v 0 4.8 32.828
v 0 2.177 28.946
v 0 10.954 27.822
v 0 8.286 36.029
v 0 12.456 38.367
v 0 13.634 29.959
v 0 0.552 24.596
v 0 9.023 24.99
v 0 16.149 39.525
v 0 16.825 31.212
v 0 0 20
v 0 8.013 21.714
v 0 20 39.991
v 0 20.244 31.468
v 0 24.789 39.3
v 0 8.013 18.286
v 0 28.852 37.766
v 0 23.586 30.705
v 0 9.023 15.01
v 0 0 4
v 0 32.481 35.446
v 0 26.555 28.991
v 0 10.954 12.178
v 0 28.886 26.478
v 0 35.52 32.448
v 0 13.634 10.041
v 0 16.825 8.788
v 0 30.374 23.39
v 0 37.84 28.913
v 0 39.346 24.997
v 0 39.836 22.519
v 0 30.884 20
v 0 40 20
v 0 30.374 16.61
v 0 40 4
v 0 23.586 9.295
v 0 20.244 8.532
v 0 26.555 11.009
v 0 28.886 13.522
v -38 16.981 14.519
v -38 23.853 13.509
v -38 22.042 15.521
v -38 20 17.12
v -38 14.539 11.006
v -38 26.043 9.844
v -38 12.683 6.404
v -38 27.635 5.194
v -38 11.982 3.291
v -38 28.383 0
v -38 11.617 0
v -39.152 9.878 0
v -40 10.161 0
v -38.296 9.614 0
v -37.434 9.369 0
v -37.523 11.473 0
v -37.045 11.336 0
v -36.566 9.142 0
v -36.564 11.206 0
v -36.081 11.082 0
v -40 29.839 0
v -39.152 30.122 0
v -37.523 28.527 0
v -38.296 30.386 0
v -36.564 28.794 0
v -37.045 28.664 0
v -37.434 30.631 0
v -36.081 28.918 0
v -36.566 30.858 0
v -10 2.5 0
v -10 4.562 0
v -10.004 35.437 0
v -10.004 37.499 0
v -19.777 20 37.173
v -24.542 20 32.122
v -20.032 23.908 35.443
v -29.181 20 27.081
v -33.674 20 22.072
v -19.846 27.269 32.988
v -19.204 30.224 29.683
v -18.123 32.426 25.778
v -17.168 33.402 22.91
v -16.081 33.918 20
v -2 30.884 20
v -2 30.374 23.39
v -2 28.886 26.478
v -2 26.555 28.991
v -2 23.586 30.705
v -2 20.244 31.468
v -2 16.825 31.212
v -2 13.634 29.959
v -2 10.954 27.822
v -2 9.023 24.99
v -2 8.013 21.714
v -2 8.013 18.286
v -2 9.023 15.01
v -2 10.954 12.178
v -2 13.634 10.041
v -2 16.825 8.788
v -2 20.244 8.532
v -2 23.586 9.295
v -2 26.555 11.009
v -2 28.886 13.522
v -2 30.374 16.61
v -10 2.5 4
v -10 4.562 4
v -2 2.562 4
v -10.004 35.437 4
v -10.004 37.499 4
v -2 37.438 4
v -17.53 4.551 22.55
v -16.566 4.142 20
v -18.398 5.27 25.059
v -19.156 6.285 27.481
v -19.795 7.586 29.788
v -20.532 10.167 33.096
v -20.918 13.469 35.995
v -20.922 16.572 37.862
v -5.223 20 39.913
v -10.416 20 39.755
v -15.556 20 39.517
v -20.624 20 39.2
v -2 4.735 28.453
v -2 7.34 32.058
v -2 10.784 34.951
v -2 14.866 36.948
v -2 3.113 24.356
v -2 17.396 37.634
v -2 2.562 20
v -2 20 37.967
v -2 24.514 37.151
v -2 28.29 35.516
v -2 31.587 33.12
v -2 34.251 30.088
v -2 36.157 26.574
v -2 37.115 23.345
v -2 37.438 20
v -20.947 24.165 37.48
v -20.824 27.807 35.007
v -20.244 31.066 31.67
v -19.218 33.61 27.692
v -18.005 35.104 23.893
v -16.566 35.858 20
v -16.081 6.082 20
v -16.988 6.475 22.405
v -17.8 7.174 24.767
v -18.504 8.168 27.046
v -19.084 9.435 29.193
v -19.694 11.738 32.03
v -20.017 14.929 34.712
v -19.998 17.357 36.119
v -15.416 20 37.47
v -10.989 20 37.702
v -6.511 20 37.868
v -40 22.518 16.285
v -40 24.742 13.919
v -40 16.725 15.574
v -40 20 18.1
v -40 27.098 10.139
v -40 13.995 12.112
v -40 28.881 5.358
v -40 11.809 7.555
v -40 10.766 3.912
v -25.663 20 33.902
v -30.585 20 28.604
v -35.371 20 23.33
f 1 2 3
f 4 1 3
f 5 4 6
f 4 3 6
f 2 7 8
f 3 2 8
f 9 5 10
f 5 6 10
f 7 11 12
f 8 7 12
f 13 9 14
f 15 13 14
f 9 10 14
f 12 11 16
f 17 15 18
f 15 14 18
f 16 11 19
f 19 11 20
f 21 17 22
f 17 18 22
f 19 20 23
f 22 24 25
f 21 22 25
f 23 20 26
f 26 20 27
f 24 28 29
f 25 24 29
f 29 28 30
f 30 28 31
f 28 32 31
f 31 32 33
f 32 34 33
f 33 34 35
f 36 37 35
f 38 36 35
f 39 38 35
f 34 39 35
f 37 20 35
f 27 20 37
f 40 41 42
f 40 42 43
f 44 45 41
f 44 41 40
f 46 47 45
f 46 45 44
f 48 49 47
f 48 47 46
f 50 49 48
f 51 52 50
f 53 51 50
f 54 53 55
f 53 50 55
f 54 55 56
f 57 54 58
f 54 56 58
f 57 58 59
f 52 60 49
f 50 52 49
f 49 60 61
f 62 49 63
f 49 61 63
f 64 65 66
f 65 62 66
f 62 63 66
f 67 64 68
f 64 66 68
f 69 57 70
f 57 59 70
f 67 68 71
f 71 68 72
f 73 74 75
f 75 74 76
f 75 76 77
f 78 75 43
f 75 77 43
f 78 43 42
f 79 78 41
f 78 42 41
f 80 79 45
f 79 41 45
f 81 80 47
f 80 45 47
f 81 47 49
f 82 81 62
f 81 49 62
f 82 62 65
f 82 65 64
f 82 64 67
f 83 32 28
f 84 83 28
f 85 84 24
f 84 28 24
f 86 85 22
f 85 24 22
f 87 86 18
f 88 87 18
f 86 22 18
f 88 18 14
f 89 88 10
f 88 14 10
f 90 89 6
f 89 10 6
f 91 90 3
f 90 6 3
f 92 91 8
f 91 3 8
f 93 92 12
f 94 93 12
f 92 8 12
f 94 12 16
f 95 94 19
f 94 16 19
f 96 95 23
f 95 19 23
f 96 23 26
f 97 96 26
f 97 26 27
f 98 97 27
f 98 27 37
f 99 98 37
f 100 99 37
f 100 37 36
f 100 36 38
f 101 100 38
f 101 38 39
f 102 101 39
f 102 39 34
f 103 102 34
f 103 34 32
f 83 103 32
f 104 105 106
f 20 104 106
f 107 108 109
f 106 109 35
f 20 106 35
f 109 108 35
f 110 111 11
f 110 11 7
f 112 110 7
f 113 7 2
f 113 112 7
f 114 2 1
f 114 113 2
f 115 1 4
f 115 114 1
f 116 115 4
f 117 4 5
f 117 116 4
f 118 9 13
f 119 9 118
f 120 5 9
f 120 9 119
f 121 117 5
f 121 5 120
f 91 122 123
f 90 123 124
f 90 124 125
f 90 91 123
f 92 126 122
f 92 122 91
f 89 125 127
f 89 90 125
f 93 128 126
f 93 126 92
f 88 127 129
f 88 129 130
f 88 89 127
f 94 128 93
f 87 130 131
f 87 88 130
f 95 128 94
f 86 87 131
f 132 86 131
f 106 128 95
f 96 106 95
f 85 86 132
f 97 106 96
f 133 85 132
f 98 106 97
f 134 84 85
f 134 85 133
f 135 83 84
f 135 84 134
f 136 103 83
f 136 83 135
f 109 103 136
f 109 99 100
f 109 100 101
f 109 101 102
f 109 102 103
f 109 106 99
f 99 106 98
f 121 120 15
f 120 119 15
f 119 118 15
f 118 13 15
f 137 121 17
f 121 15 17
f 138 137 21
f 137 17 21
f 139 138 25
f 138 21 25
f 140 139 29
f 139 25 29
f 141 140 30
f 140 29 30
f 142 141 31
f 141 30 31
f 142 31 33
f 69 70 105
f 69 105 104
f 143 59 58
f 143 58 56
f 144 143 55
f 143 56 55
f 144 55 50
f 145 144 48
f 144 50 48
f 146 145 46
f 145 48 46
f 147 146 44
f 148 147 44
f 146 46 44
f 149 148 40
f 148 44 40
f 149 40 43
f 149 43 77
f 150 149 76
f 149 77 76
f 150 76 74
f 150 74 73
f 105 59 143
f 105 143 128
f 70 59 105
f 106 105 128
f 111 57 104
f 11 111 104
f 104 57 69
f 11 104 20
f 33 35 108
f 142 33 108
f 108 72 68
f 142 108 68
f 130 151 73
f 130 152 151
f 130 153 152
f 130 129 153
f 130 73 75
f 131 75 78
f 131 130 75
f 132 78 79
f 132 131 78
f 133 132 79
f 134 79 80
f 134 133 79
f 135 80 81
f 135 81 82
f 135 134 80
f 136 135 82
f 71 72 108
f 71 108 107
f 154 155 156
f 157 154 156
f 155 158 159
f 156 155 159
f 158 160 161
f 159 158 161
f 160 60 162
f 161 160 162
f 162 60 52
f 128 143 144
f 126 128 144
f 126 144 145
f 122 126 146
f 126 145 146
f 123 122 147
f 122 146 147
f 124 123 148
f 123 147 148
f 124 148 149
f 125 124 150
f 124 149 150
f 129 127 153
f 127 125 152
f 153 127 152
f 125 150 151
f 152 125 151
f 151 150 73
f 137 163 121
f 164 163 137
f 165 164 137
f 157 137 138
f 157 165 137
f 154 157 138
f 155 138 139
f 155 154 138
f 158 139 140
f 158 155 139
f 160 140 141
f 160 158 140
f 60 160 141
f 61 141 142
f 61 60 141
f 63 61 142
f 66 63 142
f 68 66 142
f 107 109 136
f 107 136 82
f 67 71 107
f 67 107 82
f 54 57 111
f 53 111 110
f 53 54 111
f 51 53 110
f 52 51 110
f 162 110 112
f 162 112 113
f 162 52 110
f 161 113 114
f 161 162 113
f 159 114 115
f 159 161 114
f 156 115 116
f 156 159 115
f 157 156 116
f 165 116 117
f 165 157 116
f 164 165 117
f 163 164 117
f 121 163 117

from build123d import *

# Parameters (mm, degrees)
F1_DEPTH    = 40
F2_SIZE     = 20
F3_T1_DEPTH = 120.6155281281
F3_T3_DEPTH = 120.6155281281
F3_T5_DEPTH = 112.8188914216
F3_T7_DEPTH = 112.8188914216
F5_T        = -2
F4_R        = 11.5
F6_DEPTH    = 5
F8_DEPTH    = 4


# Not quite as in the source:
# - a fillet or chamfer that OpenCascade refuses, or shapes differently, is made with other operations: its cross-section is extruded or revolved along the edge and cut away or added


with BuildPart() as f1:
    # F0 (on Top) → F1 (new body)
    with BuildSketch(Plane.XY):
        Polygon((-40, 10), (0, 0), (0, 40), (-40, 30), align=None)
    extrude(amount=F1_DEPTH)

    # F2
    f2_edges = [f1.edges().sort_by_distance(p)[0] for p in [
        (-40, 20, 40),
    ]]
    chamfer(f2_edges, length=F2_SIZE)

    # F3: fillet of radius 20 on 4 edges, made by hand

    # F3_s2 → F3_t1 (cut)
    with BuildSketch(Plane(origin=(57.9188897131, 14.4797224283, 0), x_dir=(0, 0, 1), z_dir=(-0.9701425001, -0.242535625, 0))):
        with BuildLine():
            ThreePointArc((40, 18.8057000058), (34.1421356237, 32.9478356295), (20, 38.8057000058))
            Line((20, 38.8057000058), (40, 38.8057000058))
            Line((40, 38.8057000058), (40, 18.8057000058))
        make_face()
    extrude(amount=F3_T1_DEPTH, mode=Mode.SUBTRACT)

    # F3_s4 → F3_t3 (cut)
    with BuildSketch(Plane(origin=(-68.5071250073, 17.1267812518, 0), x_dir=(0, 0, 1), z_dir=(0.9701425001, -0.242535625, 0))):
        with BuildLine():
            ThreePointArc((20, 0), (34.1421356237, -5.8578643763), (40, -20))
            Line((40, -20), (40, 0))
            Line((40, 0), (20, 0))
        make_face()
    extrude(amount=F3_T3_DEPTH, mode=Mode.SUBTRACT)

    # F3_s6 → F3_t5 (cut)
    with BuildSketch(Plane(origin=(-40.1875872415, 10.0468968104, -40.1875872415), x_dir=(0.242535625, 0.9701425001, 0), z_dir=(0.6963106238, -0.174077656, 0.6963106238))):
        with BuildLine():
            ThreePointArc((0, 26.2452181161), (4.6931480366, 39.1176803115), (16.5700282971, 45.948905439))
            Line((16.5700282971, 45.948905439), (0, 43.0644337539))
            Line((0, 43.0644337539), (0, 26.2452181161))
        make_face()
    extrude(amount=F3_T5_DEPTH, mode=Mode.SUBTRACT)

    # F3_s8 → F3_t7 (cut)
    with BuildSketch(Plane(origin=(-35.339102393, -8.8347755983, -35.339102393), x_dir=(-0.242535625, 0.9701425001, 0), z_dir=(0.6963106238, 0.174077656, 0.6963106238))):
        with BuildLine():
            ThreePointArc((22.2356717087, 39.1937001443), (34.1125519692, 32.3624750168), (38.8057000058, 19.4900128214))
            Line((38.8057000058, 19.4900128214), (38.8057000058, 36.3092284592))
            Line((38.8057000058, 36.3092284592), (22.2356717087, 39.1937001443))
        make_face()
    extrude(amount=F3_T7_DEPTH, mode=Mode.SUBTRACT)

    # F5
    f5_openings = [f1.faces().sort_by_distance(p)[0] for p in [
        (-17.771277, 20, 0),
    ]]
    offset(amount=F5_T, openings=f5_openings)

    # F4 (on face) → F6 (cut)
    with BuildSketch(Plane.YZ):
        with Locations((19.3844718719, 20)):
            Circle(F4_R)
    extrude(amount=-F6_DEPTH, mode=Mode.SUBTRACT)

    # F7 (on face) → F8 (cut)
    with BuildSketch(Plane.XY):
        Polygon((-10.0002693493, 2.5000673373), (0, 0), (0, 40), (-10.0040400222, 37.4989899944), align=None)
    extrude(amount=F8_DEPTH, mode=Mode.SUBTRACT)


solid = f1.part
